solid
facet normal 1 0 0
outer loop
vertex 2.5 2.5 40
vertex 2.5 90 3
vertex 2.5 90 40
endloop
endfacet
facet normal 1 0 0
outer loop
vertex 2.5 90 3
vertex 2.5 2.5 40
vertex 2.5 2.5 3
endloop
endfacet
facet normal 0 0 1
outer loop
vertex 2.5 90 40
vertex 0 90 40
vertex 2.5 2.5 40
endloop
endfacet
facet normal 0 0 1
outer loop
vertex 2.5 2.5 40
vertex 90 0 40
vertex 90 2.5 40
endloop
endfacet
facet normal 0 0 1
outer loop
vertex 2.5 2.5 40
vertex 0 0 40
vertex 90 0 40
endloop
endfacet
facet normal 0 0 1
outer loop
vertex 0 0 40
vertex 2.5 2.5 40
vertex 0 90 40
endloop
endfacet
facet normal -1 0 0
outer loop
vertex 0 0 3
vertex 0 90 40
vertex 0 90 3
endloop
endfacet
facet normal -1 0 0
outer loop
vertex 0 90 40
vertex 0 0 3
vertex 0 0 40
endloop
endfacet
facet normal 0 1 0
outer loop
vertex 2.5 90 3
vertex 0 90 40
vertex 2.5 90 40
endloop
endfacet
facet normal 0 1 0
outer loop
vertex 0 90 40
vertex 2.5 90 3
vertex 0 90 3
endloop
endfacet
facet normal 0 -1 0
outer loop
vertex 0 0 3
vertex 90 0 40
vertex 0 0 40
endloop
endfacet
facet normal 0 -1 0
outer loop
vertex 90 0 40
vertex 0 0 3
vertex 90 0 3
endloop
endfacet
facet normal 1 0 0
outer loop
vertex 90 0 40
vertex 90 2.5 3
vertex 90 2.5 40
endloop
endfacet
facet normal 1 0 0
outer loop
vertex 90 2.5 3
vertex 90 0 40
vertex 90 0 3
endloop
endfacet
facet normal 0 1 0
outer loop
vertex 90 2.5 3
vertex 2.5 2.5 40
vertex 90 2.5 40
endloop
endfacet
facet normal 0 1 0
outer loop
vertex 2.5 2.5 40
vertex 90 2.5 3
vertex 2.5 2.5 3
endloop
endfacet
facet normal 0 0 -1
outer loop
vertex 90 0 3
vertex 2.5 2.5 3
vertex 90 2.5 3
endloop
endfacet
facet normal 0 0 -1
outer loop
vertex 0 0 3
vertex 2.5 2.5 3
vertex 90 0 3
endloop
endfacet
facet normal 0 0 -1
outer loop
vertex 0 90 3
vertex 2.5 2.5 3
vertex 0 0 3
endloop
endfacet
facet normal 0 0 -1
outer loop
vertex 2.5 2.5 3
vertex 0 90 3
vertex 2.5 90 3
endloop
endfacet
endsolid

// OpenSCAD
// Fan box - a top plate and four walls, open at the top, to house a PC case fan as a
// magnetic stirrer. NOVEL general part.
//

top     = 90;
length  = 90;
height  = 40;
wall    = 2.5;
screw   = 4.5;
cable   = 12;

$fn = 48;

plate_t = 2;

difference() {
    union() {
        cube([top, length, plate_t]);
        for (x = [-(length / 2 - wall / 2), length / 2 - wall / 2])
            cube([wall, length, height], p = [x, 0, 0]);
        for (y = [-(top / 2 - wall / 2), top / 2 - wall / 2])
            cube([length, wall, height], p = [0, y, 0]);
    }
    translate([0, 0, -1]) cube([top, length, plate_t + 2]);                 // clear the top surface
    for (x = [-71.5 / 2, 71.5 / 2], y = [-71.5 / 2, 71.5 / 2])
        translate([x, y, -1]) cylinder(h = plate_t + 2, d = screw);           // screw holes
    // one cable notch in a wall, reaching 8 mm down from the open edge (z = height - 8)
    translate([-(length / 2 - wall / 2), 0, height - 8])
        cube([wall, cable, 8]);
}
